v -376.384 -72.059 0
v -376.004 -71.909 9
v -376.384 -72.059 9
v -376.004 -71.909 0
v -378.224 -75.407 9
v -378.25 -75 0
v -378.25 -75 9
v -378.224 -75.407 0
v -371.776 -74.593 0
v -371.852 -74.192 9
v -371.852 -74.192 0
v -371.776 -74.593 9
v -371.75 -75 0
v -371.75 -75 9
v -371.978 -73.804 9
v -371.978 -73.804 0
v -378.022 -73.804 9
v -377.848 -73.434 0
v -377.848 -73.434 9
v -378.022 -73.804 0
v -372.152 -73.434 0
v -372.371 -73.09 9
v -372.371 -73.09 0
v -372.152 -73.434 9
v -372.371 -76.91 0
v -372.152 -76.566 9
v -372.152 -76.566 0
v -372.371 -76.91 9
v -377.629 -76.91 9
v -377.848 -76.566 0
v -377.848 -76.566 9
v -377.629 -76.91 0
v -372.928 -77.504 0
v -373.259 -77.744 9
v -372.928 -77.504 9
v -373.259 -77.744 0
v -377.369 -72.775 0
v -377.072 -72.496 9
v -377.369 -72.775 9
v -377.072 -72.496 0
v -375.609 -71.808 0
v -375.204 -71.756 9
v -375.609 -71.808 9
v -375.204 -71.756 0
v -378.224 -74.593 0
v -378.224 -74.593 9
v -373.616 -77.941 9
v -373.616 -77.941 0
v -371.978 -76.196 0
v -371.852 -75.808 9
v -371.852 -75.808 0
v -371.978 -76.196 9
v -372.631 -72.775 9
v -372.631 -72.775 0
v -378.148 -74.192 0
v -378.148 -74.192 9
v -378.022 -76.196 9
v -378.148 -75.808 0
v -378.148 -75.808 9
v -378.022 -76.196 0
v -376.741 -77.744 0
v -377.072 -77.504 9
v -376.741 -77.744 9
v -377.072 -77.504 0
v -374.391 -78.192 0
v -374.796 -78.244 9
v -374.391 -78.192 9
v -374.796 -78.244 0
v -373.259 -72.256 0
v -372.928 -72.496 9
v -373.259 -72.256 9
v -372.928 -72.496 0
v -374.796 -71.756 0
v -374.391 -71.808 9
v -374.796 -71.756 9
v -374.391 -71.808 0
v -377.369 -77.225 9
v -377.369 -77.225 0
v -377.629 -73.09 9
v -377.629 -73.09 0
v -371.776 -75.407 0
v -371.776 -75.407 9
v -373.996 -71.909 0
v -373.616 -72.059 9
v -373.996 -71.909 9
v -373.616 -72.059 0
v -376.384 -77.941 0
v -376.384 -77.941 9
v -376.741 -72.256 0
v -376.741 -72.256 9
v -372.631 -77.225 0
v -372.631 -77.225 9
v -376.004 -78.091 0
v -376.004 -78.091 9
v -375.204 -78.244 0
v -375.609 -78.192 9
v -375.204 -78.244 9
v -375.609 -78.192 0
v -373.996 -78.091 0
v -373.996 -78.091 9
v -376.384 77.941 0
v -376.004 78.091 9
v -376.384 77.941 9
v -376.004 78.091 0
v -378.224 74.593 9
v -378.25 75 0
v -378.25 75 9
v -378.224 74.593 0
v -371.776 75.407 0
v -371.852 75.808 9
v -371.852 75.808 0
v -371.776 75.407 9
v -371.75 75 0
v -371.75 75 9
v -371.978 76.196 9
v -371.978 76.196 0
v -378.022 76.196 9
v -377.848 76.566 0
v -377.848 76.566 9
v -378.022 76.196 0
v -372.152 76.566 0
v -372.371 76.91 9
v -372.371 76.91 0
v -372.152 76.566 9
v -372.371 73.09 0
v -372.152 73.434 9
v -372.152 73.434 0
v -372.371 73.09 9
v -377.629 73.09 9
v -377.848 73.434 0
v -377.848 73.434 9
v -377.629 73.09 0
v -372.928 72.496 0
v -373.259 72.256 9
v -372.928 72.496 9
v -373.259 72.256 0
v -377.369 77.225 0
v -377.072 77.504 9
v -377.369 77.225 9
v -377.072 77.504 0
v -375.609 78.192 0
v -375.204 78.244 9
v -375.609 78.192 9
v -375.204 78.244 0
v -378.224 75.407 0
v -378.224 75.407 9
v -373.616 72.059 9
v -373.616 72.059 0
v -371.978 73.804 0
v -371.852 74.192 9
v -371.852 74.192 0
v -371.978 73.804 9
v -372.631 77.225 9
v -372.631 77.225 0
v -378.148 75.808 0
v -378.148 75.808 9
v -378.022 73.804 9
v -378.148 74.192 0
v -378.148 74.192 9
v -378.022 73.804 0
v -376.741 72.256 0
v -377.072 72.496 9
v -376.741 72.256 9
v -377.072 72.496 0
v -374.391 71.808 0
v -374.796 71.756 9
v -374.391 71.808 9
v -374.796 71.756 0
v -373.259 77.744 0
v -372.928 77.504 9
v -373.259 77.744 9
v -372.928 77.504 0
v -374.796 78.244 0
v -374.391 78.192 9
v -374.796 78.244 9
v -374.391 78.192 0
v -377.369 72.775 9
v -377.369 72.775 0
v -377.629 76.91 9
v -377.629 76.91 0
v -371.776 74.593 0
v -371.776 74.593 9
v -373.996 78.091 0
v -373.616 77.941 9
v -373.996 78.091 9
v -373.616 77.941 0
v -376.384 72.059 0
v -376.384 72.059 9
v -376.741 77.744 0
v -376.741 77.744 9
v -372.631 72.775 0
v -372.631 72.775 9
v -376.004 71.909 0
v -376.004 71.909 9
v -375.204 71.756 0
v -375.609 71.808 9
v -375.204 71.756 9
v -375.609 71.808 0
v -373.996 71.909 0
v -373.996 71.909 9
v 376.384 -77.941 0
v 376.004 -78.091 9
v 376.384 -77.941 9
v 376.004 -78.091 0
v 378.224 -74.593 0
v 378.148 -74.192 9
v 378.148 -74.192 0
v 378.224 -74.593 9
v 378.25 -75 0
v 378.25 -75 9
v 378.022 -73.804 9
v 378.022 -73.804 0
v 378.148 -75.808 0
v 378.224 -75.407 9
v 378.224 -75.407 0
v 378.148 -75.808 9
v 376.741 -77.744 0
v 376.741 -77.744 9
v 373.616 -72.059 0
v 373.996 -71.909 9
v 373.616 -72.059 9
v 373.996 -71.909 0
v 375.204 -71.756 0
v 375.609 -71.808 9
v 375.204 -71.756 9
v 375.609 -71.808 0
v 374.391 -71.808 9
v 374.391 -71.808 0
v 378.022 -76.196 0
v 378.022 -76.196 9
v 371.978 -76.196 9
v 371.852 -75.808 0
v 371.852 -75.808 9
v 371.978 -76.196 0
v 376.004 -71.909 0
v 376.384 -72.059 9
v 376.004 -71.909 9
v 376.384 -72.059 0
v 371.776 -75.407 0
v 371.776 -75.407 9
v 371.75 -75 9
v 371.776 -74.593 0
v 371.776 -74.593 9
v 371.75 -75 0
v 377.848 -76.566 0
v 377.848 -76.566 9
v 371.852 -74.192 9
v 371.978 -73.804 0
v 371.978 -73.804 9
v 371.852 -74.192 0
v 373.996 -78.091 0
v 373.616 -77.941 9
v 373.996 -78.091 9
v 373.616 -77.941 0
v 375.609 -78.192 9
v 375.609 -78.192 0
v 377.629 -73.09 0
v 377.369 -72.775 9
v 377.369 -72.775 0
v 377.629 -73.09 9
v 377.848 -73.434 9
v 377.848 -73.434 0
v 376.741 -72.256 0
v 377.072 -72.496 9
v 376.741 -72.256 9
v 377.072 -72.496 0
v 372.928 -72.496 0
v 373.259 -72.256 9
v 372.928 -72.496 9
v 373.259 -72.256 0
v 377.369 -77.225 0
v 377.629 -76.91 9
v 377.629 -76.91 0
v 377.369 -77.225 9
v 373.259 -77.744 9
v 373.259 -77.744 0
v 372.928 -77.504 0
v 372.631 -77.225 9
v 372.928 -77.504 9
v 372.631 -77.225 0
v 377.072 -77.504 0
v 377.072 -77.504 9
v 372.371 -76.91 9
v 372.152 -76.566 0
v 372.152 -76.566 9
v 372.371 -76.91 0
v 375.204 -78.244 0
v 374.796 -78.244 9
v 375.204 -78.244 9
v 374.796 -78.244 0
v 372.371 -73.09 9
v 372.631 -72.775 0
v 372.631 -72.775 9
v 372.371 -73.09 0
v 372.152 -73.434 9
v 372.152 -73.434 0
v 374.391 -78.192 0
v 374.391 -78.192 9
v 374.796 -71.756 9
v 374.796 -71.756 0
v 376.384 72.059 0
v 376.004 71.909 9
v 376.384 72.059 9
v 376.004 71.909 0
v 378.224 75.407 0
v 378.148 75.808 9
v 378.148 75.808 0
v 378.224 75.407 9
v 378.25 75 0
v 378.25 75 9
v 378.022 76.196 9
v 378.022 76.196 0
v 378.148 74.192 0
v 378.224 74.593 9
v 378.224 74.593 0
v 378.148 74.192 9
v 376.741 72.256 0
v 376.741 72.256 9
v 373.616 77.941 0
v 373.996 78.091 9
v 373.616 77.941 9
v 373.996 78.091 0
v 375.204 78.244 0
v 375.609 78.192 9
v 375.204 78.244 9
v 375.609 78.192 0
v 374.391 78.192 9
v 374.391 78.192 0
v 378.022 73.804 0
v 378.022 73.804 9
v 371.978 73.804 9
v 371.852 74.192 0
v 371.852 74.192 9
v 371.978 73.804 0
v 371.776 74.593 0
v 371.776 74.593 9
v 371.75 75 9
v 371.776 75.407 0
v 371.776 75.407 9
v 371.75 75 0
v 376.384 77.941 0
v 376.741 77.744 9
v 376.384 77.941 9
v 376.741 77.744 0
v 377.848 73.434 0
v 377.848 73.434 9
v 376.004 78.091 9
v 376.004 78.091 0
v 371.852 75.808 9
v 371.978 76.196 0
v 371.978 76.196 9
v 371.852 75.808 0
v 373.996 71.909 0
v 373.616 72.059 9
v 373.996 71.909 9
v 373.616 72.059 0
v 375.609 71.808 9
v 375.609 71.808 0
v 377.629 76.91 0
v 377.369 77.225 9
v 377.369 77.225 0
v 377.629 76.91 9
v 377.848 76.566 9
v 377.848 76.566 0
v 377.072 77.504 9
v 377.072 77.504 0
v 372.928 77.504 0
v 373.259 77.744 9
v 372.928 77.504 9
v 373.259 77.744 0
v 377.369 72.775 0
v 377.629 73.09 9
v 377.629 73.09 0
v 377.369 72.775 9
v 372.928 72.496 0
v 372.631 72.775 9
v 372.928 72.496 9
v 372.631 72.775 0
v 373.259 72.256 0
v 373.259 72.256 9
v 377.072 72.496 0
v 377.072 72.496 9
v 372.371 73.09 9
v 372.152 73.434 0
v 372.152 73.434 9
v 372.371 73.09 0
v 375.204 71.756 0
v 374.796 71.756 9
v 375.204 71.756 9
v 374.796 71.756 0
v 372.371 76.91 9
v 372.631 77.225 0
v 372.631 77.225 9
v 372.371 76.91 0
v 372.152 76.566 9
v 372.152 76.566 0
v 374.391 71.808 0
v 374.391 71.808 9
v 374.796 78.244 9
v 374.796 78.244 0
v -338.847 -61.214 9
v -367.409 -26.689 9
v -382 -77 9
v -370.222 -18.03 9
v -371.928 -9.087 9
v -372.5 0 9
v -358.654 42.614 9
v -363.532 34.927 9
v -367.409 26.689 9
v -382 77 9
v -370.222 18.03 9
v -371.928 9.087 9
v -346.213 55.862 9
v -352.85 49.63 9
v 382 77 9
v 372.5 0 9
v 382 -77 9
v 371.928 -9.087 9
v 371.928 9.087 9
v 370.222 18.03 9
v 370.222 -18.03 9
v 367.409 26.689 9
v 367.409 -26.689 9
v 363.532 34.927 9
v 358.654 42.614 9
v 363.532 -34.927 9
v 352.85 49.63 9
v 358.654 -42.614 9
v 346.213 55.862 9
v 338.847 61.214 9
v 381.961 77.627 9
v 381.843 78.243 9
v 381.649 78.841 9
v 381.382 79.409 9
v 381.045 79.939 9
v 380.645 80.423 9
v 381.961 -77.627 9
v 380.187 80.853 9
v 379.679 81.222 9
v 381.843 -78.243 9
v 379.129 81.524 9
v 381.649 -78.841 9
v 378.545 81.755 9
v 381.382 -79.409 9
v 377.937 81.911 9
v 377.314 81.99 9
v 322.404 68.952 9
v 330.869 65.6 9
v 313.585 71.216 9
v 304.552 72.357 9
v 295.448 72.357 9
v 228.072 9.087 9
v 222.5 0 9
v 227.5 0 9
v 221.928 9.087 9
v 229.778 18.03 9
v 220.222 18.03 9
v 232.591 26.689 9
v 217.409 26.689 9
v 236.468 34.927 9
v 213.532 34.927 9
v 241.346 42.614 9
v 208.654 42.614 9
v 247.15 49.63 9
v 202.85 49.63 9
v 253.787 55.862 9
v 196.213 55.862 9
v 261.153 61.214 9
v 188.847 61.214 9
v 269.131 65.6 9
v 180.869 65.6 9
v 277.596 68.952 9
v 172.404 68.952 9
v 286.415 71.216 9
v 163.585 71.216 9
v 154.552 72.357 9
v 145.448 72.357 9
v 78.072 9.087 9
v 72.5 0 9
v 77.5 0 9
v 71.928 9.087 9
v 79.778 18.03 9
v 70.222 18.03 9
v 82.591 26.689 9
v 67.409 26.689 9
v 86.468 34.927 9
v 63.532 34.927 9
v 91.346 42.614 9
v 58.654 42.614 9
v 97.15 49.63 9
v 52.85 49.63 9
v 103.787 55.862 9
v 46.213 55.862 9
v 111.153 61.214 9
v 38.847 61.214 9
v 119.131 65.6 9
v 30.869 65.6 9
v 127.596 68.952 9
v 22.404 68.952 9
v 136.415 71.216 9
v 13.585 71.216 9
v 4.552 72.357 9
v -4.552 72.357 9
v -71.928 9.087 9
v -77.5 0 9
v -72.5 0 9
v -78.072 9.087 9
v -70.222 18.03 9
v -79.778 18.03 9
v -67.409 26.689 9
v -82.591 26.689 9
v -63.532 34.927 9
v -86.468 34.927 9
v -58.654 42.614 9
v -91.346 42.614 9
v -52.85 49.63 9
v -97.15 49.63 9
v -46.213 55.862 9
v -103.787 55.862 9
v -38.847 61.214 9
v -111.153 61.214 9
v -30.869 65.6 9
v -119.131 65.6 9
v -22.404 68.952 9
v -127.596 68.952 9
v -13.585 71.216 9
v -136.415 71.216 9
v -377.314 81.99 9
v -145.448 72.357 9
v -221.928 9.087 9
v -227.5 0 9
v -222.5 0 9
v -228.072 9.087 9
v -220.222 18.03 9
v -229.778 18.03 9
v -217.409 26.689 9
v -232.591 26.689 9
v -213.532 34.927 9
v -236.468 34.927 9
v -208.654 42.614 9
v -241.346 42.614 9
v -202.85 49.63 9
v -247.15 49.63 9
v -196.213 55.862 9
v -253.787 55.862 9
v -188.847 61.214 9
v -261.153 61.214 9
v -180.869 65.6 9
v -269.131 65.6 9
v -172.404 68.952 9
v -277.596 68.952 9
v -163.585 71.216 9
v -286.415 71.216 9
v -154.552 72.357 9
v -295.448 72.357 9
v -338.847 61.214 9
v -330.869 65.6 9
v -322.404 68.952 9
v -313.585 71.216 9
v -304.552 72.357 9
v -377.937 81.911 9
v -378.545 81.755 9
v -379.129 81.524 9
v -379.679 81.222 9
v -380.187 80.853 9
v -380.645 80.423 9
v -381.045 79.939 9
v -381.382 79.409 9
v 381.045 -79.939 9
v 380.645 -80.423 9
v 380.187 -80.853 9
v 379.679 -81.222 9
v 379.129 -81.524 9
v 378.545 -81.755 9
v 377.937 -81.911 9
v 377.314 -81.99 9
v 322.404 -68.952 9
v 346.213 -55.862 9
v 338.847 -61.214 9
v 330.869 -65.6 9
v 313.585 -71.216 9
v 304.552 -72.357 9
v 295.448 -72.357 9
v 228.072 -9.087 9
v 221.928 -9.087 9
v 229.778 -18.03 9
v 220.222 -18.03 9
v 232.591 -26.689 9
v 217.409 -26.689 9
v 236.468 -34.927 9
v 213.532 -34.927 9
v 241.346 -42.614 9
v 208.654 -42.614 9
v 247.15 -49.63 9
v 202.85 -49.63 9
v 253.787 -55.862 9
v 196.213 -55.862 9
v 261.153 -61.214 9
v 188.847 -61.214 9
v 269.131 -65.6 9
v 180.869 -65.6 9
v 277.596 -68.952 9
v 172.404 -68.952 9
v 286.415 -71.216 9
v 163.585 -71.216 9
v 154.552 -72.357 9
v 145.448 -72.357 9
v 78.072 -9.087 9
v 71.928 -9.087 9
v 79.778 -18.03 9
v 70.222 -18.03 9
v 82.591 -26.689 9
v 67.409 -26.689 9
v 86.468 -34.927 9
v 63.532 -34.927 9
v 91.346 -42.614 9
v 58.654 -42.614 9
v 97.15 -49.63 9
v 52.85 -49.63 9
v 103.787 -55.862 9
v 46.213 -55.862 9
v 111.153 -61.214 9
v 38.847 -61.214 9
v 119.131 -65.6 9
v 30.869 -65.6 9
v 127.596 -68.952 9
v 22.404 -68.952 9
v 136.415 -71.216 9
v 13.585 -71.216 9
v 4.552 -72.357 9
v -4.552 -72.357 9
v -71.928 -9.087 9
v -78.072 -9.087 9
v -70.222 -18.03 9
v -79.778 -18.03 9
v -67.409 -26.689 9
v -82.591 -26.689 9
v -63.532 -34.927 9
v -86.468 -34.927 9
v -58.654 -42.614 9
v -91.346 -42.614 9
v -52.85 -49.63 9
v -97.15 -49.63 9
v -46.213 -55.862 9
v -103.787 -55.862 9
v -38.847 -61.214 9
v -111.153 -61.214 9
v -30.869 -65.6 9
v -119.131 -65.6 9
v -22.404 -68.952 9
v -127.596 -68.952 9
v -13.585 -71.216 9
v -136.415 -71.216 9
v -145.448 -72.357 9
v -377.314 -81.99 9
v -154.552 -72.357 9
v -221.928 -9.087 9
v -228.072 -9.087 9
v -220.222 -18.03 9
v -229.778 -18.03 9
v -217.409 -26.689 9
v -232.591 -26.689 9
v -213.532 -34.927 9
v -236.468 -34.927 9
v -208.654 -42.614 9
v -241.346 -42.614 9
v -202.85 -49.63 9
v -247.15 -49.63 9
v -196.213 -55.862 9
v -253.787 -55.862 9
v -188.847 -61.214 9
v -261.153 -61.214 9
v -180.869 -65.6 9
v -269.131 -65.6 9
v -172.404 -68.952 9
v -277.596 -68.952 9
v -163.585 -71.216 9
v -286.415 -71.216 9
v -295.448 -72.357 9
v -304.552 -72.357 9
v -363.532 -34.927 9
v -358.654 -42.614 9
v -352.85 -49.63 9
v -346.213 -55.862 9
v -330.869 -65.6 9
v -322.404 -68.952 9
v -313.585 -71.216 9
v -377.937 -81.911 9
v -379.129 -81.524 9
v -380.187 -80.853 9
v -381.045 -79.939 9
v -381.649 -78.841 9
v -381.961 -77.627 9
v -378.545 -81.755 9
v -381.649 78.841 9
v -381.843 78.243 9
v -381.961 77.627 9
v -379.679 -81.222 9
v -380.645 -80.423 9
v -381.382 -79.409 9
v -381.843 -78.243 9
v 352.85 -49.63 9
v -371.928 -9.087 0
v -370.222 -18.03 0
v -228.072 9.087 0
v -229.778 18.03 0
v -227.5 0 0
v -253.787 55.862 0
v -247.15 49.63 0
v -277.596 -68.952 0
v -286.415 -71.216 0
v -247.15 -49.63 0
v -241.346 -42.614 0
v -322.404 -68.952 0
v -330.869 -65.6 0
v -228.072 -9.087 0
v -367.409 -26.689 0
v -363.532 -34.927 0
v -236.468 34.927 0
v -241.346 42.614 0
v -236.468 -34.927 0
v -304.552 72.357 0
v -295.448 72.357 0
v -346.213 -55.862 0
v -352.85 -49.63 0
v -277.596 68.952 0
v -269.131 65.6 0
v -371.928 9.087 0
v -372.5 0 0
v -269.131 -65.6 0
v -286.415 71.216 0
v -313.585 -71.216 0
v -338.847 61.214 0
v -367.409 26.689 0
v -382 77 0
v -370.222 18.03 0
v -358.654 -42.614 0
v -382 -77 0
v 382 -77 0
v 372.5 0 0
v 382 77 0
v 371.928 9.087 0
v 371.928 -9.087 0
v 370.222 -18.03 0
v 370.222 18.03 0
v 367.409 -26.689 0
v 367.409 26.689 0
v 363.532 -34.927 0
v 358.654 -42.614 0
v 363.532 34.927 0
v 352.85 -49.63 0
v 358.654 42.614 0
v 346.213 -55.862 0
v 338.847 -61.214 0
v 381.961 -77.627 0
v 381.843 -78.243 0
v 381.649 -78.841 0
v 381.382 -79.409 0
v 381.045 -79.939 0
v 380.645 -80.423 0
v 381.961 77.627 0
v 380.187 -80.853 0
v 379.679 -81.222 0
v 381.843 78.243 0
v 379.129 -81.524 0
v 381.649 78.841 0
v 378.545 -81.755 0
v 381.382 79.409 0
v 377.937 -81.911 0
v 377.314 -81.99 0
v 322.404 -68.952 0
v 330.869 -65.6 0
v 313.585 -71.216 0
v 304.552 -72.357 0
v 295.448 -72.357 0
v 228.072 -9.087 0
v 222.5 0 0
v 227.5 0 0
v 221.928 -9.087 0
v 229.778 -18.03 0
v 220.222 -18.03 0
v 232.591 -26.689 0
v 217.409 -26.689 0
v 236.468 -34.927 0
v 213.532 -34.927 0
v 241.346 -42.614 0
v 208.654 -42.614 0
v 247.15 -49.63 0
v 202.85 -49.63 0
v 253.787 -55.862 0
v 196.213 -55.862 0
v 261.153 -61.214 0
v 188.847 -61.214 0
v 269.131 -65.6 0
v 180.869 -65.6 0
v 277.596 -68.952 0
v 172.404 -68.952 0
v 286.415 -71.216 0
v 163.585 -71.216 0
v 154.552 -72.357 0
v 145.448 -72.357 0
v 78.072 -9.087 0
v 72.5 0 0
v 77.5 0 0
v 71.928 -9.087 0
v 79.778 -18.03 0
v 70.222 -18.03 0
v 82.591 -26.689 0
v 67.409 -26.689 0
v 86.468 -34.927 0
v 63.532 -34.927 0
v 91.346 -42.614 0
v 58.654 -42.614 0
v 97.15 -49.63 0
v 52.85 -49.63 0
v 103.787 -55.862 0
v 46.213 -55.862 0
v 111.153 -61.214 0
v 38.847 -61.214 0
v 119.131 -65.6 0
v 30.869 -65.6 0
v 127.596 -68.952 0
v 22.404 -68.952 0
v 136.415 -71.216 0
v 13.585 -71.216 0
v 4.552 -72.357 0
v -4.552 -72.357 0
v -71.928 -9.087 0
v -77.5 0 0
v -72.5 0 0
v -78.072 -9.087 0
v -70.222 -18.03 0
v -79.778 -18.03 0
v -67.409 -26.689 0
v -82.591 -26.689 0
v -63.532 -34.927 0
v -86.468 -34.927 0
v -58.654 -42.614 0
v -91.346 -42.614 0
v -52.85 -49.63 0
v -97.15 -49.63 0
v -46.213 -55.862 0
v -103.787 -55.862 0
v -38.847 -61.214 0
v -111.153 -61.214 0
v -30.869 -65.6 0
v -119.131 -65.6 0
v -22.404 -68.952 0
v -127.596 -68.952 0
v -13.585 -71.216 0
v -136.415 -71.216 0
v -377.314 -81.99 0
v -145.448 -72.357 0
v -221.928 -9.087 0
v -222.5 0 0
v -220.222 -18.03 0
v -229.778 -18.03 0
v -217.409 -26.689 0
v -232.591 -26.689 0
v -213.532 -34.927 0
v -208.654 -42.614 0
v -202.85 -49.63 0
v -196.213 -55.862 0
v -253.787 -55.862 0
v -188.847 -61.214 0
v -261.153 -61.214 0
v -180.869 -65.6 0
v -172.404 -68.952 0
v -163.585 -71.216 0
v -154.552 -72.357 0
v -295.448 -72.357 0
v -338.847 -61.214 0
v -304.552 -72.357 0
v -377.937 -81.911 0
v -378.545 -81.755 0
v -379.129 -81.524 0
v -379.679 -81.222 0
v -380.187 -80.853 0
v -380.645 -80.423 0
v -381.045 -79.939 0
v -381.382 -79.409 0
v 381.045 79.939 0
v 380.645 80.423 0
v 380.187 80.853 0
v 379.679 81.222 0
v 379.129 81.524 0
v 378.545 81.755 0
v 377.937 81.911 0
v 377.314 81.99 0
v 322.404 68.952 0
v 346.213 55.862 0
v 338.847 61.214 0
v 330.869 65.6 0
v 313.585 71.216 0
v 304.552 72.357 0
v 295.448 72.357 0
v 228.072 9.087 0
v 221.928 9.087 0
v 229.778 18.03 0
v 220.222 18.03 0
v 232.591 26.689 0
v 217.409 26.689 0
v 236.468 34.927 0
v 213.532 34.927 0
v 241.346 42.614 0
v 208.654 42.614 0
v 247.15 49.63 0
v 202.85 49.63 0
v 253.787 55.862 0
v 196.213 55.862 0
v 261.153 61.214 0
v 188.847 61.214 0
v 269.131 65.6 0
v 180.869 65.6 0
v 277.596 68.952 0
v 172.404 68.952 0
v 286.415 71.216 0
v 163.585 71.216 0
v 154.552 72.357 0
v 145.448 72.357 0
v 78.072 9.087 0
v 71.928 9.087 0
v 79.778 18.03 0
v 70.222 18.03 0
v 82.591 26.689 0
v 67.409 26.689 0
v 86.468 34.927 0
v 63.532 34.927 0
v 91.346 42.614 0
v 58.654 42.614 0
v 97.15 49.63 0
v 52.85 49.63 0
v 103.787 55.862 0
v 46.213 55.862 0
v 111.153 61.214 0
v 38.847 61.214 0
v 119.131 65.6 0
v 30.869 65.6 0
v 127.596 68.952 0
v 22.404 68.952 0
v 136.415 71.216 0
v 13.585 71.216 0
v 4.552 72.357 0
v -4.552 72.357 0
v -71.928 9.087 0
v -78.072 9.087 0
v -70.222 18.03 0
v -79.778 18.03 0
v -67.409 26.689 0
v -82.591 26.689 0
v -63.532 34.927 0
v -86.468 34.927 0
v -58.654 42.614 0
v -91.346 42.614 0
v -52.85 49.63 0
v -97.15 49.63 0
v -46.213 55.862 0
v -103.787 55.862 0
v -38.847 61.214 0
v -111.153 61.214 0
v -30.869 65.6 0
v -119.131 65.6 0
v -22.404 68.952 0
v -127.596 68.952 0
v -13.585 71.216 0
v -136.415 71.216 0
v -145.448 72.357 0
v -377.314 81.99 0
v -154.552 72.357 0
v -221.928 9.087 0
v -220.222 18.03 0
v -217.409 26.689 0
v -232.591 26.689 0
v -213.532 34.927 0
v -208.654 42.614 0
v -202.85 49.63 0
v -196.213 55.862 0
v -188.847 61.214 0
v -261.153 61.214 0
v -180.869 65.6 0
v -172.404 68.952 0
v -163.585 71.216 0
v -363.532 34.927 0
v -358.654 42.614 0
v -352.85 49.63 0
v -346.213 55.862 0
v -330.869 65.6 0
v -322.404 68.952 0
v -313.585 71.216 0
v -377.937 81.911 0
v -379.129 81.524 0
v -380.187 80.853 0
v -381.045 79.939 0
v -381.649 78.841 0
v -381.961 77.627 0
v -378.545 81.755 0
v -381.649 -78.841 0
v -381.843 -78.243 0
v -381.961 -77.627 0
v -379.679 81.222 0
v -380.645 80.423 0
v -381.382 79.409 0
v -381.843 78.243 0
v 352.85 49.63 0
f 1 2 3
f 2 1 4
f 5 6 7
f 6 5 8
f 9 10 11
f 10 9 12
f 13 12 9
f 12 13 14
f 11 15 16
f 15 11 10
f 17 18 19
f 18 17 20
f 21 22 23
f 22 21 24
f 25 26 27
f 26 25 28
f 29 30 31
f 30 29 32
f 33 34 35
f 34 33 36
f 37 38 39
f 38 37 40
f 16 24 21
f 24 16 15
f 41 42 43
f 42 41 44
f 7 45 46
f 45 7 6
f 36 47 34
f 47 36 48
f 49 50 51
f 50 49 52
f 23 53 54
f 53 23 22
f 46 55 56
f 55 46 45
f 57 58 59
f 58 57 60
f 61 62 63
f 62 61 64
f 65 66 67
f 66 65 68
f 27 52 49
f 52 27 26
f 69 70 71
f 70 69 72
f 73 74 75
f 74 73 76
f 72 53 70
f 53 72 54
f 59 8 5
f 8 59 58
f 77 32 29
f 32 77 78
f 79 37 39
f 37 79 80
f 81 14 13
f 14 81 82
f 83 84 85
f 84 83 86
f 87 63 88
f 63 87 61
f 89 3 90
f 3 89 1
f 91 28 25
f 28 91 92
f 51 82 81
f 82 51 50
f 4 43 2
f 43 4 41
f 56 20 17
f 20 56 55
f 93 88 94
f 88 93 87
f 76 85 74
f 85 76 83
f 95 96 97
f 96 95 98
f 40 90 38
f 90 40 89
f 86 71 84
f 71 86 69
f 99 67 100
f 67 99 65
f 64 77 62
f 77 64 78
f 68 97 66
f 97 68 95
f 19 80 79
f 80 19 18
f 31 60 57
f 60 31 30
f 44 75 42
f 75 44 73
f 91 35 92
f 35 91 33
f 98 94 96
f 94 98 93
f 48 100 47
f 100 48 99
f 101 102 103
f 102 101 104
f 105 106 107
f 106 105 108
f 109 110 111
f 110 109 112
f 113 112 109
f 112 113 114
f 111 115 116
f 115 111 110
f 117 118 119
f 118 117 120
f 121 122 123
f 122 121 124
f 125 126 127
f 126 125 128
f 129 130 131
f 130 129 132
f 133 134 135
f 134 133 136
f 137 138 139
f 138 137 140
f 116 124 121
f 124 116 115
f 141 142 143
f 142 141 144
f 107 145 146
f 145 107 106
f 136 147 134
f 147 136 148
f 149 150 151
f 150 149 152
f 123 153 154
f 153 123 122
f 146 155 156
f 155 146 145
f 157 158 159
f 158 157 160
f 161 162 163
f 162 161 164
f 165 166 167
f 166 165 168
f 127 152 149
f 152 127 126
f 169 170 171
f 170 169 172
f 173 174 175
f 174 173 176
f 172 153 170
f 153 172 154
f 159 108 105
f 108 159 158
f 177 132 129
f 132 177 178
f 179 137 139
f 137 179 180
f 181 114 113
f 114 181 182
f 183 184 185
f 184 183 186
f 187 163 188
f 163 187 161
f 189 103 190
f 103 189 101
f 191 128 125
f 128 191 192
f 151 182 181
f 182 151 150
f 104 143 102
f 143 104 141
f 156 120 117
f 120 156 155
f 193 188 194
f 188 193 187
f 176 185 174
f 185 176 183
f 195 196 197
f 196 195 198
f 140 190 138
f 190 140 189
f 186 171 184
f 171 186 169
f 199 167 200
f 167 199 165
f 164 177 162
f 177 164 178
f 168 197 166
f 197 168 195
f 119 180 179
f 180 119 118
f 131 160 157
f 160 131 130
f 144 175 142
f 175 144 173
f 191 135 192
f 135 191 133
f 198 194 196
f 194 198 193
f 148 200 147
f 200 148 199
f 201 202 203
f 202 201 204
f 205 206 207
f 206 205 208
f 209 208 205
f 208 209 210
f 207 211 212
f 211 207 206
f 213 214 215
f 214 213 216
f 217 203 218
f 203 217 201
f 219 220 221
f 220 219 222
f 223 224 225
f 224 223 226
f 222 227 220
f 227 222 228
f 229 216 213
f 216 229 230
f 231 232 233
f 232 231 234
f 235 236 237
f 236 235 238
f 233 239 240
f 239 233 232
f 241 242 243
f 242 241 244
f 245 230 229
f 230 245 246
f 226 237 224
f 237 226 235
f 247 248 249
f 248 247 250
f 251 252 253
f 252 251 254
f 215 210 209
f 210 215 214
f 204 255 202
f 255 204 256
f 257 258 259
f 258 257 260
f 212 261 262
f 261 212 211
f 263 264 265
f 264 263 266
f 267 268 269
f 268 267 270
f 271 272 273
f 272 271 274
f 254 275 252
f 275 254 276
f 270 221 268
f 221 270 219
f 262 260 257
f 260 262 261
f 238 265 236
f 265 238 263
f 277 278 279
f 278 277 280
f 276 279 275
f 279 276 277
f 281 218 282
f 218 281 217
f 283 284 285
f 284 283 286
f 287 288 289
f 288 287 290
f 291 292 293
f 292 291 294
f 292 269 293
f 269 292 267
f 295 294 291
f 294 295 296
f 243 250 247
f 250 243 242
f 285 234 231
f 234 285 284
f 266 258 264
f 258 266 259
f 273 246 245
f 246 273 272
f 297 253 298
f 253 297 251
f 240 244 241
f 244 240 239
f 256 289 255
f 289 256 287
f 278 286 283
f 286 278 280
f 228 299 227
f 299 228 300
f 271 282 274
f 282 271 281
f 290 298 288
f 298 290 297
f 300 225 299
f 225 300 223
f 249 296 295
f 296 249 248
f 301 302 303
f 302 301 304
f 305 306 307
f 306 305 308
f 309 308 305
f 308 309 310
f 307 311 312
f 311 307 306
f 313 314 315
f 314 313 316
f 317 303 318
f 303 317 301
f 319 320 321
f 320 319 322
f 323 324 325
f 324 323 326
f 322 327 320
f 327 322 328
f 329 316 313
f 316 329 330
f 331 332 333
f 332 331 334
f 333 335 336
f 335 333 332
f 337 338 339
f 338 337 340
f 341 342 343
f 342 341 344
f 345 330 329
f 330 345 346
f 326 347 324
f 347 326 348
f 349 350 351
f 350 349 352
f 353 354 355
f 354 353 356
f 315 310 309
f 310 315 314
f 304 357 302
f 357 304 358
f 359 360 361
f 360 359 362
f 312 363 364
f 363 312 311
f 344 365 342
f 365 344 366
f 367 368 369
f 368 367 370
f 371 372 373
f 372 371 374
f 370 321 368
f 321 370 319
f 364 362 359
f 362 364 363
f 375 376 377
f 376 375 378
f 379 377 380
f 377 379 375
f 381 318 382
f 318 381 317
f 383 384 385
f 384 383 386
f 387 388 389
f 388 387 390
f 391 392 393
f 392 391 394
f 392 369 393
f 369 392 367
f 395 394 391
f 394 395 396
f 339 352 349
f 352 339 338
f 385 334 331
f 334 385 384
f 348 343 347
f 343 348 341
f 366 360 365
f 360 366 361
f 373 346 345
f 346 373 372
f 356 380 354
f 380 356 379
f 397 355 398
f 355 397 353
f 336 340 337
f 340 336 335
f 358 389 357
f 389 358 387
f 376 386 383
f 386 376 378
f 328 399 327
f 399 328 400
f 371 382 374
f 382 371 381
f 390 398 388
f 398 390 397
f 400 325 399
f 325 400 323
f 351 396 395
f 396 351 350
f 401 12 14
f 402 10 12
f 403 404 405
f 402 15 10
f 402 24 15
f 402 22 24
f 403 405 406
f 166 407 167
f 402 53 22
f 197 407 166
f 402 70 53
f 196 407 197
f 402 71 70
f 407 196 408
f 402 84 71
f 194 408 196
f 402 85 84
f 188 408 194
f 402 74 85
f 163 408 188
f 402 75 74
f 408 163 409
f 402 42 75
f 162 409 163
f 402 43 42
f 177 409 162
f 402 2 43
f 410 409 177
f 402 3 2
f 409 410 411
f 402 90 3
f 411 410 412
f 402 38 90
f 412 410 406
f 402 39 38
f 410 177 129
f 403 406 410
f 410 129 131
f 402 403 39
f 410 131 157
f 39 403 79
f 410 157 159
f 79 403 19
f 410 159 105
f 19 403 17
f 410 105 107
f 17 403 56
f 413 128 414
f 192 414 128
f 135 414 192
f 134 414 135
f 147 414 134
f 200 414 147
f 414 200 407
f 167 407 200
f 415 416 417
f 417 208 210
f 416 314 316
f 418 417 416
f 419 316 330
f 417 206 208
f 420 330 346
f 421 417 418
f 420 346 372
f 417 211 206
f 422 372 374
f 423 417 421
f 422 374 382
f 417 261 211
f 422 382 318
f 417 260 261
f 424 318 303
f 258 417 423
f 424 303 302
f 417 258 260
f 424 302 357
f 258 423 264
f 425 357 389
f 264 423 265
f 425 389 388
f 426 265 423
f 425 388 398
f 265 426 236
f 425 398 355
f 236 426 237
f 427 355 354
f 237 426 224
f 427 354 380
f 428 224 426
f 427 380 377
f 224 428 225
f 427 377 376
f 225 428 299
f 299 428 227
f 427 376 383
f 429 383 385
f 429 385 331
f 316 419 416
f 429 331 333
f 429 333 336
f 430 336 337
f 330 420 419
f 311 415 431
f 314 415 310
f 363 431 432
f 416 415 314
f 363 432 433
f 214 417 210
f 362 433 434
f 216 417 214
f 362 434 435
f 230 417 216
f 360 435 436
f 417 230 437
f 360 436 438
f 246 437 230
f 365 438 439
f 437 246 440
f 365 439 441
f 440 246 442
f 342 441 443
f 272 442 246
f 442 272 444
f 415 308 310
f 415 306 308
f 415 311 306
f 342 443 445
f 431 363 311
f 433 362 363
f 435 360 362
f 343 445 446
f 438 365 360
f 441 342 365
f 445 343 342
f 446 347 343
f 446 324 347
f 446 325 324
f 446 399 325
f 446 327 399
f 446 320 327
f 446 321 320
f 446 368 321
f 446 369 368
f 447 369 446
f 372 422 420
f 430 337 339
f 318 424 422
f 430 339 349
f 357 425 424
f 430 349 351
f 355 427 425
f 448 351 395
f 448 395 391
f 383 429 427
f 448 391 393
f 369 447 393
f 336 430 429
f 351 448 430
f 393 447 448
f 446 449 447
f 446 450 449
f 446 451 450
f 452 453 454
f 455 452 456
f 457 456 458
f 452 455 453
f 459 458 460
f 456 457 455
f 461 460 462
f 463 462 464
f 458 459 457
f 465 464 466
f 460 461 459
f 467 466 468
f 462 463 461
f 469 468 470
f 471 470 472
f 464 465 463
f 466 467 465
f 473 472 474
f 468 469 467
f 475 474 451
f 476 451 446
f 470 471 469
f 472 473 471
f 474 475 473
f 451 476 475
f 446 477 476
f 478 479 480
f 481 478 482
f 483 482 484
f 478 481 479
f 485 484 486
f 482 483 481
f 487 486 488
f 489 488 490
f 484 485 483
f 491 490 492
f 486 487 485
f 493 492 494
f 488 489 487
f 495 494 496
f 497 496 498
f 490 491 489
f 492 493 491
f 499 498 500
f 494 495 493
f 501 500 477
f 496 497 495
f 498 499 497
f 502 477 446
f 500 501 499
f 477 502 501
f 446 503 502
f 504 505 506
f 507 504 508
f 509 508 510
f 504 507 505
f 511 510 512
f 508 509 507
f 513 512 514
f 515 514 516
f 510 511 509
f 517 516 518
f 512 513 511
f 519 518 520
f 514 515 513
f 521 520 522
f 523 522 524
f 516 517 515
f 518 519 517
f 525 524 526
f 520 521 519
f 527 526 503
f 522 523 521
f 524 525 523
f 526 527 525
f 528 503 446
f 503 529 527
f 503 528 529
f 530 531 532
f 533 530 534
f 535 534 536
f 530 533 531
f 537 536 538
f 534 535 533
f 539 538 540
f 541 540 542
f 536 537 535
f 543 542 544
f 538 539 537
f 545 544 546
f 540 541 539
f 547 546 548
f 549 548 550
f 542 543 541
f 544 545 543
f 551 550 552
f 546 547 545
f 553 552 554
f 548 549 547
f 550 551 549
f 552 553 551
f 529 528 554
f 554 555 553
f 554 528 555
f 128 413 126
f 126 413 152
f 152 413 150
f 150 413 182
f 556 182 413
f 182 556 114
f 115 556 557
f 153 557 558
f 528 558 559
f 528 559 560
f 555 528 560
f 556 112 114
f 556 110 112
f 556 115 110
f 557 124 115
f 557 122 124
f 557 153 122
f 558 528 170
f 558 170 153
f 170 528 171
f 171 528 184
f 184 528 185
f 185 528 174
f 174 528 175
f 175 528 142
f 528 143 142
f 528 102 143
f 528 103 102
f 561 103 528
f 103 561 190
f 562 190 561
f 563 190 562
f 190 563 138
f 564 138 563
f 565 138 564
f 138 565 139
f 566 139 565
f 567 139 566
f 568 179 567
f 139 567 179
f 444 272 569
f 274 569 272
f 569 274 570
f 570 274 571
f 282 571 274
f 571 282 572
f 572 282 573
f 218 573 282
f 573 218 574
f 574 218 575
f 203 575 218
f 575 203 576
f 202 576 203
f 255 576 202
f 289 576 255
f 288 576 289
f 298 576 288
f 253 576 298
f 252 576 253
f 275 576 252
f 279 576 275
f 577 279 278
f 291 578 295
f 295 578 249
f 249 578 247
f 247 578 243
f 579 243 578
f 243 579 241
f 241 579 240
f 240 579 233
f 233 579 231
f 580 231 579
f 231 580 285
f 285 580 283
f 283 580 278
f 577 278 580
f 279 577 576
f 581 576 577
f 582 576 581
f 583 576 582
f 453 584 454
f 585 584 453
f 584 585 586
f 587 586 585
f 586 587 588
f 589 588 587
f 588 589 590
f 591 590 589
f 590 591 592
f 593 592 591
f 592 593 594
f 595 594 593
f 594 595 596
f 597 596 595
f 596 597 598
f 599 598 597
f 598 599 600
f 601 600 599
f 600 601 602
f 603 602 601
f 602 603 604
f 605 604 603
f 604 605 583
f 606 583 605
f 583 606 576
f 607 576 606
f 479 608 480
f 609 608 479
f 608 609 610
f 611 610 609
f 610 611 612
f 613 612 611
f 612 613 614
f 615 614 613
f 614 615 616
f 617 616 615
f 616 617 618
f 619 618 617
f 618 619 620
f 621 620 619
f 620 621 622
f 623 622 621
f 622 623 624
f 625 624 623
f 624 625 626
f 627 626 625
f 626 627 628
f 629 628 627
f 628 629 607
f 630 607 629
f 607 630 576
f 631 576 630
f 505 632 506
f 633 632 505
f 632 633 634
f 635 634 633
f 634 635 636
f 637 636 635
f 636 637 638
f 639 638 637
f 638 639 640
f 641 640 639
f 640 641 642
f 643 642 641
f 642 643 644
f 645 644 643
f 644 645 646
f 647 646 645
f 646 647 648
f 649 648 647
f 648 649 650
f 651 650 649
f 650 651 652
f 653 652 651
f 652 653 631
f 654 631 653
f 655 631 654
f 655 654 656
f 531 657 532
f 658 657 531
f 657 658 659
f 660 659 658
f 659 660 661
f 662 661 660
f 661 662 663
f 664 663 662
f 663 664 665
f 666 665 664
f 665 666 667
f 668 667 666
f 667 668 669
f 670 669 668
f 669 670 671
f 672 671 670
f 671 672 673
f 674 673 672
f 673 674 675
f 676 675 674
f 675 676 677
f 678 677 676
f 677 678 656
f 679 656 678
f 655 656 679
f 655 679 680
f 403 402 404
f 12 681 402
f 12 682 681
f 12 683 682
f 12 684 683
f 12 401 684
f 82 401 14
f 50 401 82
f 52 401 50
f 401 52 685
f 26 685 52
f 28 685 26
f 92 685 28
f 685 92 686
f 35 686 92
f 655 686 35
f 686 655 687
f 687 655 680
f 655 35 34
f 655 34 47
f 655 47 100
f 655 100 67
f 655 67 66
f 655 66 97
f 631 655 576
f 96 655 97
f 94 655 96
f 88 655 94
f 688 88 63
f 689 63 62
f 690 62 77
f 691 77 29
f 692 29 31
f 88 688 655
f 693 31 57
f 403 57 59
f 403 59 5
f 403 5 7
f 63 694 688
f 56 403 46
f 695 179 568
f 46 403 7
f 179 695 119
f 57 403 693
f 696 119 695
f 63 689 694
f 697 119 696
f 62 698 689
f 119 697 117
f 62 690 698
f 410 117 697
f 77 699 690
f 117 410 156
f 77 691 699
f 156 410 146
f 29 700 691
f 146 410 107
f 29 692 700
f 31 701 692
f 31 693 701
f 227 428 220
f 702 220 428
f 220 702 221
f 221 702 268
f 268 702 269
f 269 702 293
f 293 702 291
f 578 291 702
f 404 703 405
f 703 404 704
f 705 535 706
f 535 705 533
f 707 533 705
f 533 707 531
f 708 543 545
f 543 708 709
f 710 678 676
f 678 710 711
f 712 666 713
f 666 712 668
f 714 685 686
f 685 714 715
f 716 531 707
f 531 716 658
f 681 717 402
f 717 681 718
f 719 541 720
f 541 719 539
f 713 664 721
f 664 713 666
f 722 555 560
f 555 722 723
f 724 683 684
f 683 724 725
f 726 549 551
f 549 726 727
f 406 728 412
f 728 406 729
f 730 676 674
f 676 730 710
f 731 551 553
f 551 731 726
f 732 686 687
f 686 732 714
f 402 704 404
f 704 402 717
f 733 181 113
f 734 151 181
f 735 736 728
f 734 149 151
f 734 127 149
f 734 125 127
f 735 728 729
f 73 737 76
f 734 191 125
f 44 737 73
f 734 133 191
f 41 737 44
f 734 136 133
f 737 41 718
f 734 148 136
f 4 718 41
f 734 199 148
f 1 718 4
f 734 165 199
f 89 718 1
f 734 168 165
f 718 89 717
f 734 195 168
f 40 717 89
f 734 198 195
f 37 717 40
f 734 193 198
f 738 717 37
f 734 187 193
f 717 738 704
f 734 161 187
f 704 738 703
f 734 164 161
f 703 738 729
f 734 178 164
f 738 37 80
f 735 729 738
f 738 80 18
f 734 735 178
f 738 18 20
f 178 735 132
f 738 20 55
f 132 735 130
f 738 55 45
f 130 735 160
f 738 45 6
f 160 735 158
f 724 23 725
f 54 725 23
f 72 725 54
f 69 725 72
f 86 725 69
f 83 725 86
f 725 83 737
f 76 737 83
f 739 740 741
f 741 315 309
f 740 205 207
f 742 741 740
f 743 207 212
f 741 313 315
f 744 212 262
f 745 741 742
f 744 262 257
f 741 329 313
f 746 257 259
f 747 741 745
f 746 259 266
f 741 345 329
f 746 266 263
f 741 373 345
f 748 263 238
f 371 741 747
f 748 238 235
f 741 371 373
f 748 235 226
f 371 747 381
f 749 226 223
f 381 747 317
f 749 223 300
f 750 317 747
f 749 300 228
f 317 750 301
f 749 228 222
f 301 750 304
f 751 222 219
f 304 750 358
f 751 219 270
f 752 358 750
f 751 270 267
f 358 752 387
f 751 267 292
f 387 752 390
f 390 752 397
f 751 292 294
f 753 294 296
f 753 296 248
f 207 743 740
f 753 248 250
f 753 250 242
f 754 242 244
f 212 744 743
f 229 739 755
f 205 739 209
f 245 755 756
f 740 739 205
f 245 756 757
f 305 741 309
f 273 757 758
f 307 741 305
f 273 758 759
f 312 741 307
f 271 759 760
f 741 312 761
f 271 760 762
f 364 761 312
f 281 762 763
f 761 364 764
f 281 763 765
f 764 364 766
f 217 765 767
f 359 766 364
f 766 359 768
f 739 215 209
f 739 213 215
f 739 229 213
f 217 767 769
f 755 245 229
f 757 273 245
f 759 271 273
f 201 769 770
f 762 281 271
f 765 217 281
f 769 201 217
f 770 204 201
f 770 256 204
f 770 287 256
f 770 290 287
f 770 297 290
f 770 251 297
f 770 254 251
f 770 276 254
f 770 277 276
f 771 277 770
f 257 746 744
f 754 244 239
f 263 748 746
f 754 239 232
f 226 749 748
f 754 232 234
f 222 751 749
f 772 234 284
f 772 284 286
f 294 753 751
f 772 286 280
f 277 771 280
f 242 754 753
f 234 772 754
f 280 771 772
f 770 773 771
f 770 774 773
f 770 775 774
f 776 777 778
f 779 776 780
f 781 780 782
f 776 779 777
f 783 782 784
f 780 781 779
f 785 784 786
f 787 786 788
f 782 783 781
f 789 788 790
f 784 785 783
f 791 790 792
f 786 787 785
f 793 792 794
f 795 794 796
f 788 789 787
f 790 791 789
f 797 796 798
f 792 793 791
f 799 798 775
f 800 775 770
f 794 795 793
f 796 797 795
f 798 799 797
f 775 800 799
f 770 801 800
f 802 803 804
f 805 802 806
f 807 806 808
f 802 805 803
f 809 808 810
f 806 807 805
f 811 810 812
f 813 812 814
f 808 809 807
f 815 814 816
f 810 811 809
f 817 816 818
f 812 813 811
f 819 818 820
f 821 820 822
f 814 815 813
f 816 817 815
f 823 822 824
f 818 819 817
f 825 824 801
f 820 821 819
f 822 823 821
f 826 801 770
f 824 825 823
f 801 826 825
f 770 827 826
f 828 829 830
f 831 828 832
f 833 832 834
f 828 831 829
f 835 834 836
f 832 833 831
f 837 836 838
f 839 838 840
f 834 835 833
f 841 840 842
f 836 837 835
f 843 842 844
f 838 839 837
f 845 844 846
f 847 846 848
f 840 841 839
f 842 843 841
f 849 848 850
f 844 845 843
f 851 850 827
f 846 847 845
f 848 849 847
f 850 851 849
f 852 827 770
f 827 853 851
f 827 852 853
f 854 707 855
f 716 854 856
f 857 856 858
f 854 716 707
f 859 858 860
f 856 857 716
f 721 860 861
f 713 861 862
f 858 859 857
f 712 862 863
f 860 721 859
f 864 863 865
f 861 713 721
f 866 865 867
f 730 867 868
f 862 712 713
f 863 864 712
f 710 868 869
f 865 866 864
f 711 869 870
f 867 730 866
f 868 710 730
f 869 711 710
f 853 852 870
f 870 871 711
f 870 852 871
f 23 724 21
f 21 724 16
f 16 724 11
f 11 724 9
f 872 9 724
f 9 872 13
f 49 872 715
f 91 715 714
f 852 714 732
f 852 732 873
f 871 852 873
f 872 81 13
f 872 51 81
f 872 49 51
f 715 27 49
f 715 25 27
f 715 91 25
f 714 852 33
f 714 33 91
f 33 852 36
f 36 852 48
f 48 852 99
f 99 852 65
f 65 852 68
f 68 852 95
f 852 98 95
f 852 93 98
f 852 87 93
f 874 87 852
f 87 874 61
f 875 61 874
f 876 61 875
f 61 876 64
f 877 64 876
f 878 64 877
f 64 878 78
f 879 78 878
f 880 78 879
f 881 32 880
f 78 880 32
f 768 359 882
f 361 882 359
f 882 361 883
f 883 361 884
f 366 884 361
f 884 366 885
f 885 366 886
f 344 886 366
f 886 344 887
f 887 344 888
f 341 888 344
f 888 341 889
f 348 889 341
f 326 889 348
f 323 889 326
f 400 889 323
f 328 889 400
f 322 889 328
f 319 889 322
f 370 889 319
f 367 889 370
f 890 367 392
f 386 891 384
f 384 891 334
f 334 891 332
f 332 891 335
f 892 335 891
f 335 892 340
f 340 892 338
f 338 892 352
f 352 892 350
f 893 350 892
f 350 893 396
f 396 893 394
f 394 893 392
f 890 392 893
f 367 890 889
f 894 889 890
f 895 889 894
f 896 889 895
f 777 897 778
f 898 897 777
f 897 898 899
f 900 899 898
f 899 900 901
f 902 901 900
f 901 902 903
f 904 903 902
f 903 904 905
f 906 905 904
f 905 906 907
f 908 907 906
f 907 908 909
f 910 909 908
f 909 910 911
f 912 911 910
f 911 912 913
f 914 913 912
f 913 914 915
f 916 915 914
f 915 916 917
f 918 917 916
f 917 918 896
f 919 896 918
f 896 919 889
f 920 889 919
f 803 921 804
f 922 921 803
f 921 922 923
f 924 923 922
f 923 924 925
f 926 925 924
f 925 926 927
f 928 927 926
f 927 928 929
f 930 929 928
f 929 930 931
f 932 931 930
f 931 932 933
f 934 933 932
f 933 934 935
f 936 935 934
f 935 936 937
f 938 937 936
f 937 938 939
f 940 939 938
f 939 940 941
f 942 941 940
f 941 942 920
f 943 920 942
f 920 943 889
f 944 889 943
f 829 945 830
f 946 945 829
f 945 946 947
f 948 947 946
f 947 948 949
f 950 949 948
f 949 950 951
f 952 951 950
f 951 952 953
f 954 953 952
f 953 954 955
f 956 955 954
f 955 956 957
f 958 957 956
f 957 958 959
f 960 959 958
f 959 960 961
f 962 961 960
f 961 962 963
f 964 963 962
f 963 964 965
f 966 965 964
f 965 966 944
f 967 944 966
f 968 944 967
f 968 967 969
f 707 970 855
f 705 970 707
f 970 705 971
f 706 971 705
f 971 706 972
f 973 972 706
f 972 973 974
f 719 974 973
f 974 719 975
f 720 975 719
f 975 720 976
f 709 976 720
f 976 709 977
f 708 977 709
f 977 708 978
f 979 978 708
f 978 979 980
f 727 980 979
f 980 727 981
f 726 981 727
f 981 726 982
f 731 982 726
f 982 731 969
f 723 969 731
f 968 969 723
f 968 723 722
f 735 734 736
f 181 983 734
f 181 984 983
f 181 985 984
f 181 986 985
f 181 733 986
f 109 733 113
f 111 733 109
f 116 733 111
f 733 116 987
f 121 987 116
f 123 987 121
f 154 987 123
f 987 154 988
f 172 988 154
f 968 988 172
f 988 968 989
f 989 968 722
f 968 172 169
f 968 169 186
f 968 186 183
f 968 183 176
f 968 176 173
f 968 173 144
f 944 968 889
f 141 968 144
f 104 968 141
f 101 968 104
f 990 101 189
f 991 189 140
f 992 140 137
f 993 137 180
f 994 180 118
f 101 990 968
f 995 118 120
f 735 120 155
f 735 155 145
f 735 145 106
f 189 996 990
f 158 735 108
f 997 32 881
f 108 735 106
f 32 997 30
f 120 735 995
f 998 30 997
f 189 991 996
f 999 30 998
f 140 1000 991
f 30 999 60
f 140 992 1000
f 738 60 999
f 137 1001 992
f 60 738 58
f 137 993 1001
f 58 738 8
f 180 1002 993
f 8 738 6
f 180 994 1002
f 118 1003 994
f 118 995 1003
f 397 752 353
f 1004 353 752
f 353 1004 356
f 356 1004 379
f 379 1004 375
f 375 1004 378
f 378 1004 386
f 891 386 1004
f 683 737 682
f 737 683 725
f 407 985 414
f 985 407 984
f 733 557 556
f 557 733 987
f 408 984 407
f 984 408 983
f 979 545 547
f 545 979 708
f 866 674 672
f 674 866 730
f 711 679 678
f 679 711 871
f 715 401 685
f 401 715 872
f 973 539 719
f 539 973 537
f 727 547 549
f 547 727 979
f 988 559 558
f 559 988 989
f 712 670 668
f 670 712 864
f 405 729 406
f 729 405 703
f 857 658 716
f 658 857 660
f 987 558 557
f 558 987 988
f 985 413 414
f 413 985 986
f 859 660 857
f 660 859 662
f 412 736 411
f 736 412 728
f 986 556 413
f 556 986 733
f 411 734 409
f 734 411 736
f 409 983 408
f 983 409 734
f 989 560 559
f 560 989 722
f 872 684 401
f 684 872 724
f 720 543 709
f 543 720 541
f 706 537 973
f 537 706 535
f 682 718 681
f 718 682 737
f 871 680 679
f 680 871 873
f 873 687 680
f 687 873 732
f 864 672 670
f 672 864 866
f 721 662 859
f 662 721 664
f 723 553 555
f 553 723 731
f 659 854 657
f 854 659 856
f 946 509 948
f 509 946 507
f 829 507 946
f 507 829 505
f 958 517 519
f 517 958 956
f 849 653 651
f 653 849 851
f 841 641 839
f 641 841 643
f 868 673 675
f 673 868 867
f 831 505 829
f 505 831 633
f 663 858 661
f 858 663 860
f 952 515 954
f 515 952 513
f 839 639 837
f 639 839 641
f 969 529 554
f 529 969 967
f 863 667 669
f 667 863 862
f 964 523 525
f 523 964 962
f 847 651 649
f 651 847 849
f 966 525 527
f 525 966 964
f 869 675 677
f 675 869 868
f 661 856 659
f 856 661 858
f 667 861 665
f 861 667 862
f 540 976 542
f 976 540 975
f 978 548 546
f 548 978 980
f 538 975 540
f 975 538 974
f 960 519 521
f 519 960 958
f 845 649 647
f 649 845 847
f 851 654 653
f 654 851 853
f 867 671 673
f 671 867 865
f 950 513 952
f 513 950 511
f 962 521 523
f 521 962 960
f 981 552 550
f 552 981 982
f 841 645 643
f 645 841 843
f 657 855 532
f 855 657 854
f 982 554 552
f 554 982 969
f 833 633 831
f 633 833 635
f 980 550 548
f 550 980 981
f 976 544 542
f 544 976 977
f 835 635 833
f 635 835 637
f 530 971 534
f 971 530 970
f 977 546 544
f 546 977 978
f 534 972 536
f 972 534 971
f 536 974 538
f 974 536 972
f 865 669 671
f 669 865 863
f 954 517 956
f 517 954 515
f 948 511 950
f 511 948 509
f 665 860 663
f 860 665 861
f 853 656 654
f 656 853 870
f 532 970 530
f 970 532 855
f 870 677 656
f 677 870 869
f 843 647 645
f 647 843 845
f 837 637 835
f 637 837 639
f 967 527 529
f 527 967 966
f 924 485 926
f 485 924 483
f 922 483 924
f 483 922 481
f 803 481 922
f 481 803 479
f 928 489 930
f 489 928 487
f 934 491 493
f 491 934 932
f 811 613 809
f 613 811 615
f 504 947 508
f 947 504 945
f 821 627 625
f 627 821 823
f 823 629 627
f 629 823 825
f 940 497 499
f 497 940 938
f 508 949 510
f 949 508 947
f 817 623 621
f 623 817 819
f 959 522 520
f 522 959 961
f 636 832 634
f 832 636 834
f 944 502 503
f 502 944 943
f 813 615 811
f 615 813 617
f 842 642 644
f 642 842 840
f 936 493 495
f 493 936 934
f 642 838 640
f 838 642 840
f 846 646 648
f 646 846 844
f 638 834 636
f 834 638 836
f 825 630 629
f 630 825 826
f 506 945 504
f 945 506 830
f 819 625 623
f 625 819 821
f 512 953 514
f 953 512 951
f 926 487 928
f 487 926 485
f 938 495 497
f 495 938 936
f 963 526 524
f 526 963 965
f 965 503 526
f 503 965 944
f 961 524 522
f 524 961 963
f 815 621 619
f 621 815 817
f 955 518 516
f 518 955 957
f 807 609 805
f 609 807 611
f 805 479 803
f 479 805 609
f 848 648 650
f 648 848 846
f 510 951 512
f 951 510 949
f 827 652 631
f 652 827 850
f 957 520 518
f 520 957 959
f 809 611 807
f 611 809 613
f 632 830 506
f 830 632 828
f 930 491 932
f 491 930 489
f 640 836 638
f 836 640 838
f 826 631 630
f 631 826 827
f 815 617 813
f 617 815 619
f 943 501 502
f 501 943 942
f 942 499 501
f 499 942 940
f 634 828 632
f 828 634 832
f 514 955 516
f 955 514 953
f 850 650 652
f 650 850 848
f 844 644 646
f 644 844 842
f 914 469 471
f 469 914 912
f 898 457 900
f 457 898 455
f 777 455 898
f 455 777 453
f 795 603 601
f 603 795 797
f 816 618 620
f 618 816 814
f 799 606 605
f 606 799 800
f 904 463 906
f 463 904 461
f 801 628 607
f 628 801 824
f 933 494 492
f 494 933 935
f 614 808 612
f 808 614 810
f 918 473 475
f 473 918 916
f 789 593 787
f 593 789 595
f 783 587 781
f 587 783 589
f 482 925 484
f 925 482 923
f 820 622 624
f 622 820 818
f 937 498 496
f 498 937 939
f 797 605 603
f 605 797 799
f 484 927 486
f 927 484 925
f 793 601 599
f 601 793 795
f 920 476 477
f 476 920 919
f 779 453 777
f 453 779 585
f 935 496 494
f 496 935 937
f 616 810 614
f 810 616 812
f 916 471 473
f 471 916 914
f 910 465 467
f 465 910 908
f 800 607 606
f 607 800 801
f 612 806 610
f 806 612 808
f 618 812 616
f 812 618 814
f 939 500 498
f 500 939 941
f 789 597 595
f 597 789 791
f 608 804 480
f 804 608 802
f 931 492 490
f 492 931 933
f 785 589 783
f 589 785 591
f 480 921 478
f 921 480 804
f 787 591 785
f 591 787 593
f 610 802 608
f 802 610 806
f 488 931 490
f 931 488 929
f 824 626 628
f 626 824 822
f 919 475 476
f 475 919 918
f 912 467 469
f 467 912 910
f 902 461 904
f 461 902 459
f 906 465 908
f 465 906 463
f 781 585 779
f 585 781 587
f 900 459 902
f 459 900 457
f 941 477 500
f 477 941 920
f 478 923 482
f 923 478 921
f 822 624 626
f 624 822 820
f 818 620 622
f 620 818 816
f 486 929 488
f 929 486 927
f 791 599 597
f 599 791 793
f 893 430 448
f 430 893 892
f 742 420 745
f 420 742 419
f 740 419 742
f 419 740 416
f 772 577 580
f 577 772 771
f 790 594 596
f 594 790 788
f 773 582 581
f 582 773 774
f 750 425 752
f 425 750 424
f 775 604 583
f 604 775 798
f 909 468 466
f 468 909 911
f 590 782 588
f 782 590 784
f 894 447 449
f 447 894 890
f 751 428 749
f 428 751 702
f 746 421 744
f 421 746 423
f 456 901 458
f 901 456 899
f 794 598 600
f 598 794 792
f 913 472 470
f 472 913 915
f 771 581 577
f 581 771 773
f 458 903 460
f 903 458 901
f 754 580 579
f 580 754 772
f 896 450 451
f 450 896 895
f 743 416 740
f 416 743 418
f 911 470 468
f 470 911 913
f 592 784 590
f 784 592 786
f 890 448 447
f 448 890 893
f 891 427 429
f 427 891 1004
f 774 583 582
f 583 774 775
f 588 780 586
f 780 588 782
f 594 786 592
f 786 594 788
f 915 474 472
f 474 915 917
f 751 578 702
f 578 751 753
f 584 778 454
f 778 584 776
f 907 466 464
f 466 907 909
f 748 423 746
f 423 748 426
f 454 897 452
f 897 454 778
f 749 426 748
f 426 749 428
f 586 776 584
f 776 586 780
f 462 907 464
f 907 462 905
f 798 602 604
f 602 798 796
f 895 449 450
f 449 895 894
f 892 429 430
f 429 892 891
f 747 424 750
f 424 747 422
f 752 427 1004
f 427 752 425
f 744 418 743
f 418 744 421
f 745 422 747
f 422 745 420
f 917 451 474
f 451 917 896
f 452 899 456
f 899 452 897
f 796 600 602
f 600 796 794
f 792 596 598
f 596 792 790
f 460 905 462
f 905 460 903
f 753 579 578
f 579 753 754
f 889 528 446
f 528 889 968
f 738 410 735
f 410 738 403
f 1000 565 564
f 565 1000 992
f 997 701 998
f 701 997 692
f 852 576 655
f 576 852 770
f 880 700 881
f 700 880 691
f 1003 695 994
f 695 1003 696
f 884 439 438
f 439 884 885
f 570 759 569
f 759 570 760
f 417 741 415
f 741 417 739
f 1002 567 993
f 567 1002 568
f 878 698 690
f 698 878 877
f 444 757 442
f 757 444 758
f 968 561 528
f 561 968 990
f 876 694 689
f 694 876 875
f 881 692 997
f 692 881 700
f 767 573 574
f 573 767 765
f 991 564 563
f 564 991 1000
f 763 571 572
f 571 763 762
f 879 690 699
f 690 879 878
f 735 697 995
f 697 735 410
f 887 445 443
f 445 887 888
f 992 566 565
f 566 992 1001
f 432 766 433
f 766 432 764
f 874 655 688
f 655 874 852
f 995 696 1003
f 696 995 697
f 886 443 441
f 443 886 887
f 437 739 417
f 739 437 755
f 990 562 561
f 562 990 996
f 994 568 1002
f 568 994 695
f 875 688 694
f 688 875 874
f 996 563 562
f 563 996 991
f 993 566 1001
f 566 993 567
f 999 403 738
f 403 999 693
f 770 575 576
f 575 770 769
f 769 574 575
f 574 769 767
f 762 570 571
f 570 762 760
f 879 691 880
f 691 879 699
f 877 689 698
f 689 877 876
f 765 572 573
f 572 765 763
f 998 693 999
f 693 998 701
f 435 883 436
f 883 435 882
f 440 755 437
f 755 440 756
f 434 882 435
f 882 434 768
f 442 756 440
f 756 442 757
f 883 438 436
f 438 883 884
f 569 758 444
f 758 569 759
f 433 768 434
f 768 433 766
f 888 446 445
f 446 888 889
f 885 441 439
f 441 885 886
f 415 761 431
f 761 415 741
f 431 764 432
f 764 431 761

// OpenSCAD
$fn = 50;

difference() {
	union() {
		hull() {
			translate(v = [-377.0, 77.0, 0]) {
				cylinder(h = 9, r = 5);
			}
			translate(v = [377.0, 77.0, 0]) {
				cylinder(h = 9, r = 5);
			}
			translate(v = [-377.0, -77.0, 0]) {
				cylinder(h = 9, r = 5);
			}
			translate(v = [377.0, -77.0, 0]) {
				cylinder(h = 9, r = 5);
			}
		}
	}
	union() {
		translate(v = [-375.0, -75.0, -100.0]) {
			cylinder(h = 200, r = 3.25);
		}
		translate(v = [-375.0, 75.0, -100.0]) {
			cylinder(h = 200, r = 3.25);
		}
		translate(v = [375.0, -75.0, -100.0]) {
			cylinder(h = 200, r = 3.25);
		}
		translate(v = [375.0, 75.0, -100.0]) {
			cylinder(h = 200, r = 3.25);
		}
		translate(v = [-375.0, -75.0, -100.0]) {
			cylinder(h = 200, r = 1.8);
		}
		translate(v = [-375.0, 75.0, -100.0]) {
			cylinder(h = 200, r = 1.8);
		}
		translate(v = [375.0, -75.0, -100.0]) {
			cylinder(h = 200, r = 1.8);
		}
		translate(v = [375.0, 75.0, -100.0]) {
			cylinder(h = 200, r = 1.8);
		}
		translate(v = [-300.0, 0, 0.0]) {
			cylinder(h = 9, r = 72.5);
		}
		translate(v = [-150.0, 0, 0.0]) {
			cylinder(h = 9, r = 72.5);
		}
		cylinder(h = 9, r = 72.5);
		translate(v = [150.0, 0, 0.0]) {
			cylinder(h = 9, r = 72.5);
		}
		translate(v = [300.0, 0, 0.0]) {
			cylinder(h = 9, r = 72.5);
		}
	}
}
